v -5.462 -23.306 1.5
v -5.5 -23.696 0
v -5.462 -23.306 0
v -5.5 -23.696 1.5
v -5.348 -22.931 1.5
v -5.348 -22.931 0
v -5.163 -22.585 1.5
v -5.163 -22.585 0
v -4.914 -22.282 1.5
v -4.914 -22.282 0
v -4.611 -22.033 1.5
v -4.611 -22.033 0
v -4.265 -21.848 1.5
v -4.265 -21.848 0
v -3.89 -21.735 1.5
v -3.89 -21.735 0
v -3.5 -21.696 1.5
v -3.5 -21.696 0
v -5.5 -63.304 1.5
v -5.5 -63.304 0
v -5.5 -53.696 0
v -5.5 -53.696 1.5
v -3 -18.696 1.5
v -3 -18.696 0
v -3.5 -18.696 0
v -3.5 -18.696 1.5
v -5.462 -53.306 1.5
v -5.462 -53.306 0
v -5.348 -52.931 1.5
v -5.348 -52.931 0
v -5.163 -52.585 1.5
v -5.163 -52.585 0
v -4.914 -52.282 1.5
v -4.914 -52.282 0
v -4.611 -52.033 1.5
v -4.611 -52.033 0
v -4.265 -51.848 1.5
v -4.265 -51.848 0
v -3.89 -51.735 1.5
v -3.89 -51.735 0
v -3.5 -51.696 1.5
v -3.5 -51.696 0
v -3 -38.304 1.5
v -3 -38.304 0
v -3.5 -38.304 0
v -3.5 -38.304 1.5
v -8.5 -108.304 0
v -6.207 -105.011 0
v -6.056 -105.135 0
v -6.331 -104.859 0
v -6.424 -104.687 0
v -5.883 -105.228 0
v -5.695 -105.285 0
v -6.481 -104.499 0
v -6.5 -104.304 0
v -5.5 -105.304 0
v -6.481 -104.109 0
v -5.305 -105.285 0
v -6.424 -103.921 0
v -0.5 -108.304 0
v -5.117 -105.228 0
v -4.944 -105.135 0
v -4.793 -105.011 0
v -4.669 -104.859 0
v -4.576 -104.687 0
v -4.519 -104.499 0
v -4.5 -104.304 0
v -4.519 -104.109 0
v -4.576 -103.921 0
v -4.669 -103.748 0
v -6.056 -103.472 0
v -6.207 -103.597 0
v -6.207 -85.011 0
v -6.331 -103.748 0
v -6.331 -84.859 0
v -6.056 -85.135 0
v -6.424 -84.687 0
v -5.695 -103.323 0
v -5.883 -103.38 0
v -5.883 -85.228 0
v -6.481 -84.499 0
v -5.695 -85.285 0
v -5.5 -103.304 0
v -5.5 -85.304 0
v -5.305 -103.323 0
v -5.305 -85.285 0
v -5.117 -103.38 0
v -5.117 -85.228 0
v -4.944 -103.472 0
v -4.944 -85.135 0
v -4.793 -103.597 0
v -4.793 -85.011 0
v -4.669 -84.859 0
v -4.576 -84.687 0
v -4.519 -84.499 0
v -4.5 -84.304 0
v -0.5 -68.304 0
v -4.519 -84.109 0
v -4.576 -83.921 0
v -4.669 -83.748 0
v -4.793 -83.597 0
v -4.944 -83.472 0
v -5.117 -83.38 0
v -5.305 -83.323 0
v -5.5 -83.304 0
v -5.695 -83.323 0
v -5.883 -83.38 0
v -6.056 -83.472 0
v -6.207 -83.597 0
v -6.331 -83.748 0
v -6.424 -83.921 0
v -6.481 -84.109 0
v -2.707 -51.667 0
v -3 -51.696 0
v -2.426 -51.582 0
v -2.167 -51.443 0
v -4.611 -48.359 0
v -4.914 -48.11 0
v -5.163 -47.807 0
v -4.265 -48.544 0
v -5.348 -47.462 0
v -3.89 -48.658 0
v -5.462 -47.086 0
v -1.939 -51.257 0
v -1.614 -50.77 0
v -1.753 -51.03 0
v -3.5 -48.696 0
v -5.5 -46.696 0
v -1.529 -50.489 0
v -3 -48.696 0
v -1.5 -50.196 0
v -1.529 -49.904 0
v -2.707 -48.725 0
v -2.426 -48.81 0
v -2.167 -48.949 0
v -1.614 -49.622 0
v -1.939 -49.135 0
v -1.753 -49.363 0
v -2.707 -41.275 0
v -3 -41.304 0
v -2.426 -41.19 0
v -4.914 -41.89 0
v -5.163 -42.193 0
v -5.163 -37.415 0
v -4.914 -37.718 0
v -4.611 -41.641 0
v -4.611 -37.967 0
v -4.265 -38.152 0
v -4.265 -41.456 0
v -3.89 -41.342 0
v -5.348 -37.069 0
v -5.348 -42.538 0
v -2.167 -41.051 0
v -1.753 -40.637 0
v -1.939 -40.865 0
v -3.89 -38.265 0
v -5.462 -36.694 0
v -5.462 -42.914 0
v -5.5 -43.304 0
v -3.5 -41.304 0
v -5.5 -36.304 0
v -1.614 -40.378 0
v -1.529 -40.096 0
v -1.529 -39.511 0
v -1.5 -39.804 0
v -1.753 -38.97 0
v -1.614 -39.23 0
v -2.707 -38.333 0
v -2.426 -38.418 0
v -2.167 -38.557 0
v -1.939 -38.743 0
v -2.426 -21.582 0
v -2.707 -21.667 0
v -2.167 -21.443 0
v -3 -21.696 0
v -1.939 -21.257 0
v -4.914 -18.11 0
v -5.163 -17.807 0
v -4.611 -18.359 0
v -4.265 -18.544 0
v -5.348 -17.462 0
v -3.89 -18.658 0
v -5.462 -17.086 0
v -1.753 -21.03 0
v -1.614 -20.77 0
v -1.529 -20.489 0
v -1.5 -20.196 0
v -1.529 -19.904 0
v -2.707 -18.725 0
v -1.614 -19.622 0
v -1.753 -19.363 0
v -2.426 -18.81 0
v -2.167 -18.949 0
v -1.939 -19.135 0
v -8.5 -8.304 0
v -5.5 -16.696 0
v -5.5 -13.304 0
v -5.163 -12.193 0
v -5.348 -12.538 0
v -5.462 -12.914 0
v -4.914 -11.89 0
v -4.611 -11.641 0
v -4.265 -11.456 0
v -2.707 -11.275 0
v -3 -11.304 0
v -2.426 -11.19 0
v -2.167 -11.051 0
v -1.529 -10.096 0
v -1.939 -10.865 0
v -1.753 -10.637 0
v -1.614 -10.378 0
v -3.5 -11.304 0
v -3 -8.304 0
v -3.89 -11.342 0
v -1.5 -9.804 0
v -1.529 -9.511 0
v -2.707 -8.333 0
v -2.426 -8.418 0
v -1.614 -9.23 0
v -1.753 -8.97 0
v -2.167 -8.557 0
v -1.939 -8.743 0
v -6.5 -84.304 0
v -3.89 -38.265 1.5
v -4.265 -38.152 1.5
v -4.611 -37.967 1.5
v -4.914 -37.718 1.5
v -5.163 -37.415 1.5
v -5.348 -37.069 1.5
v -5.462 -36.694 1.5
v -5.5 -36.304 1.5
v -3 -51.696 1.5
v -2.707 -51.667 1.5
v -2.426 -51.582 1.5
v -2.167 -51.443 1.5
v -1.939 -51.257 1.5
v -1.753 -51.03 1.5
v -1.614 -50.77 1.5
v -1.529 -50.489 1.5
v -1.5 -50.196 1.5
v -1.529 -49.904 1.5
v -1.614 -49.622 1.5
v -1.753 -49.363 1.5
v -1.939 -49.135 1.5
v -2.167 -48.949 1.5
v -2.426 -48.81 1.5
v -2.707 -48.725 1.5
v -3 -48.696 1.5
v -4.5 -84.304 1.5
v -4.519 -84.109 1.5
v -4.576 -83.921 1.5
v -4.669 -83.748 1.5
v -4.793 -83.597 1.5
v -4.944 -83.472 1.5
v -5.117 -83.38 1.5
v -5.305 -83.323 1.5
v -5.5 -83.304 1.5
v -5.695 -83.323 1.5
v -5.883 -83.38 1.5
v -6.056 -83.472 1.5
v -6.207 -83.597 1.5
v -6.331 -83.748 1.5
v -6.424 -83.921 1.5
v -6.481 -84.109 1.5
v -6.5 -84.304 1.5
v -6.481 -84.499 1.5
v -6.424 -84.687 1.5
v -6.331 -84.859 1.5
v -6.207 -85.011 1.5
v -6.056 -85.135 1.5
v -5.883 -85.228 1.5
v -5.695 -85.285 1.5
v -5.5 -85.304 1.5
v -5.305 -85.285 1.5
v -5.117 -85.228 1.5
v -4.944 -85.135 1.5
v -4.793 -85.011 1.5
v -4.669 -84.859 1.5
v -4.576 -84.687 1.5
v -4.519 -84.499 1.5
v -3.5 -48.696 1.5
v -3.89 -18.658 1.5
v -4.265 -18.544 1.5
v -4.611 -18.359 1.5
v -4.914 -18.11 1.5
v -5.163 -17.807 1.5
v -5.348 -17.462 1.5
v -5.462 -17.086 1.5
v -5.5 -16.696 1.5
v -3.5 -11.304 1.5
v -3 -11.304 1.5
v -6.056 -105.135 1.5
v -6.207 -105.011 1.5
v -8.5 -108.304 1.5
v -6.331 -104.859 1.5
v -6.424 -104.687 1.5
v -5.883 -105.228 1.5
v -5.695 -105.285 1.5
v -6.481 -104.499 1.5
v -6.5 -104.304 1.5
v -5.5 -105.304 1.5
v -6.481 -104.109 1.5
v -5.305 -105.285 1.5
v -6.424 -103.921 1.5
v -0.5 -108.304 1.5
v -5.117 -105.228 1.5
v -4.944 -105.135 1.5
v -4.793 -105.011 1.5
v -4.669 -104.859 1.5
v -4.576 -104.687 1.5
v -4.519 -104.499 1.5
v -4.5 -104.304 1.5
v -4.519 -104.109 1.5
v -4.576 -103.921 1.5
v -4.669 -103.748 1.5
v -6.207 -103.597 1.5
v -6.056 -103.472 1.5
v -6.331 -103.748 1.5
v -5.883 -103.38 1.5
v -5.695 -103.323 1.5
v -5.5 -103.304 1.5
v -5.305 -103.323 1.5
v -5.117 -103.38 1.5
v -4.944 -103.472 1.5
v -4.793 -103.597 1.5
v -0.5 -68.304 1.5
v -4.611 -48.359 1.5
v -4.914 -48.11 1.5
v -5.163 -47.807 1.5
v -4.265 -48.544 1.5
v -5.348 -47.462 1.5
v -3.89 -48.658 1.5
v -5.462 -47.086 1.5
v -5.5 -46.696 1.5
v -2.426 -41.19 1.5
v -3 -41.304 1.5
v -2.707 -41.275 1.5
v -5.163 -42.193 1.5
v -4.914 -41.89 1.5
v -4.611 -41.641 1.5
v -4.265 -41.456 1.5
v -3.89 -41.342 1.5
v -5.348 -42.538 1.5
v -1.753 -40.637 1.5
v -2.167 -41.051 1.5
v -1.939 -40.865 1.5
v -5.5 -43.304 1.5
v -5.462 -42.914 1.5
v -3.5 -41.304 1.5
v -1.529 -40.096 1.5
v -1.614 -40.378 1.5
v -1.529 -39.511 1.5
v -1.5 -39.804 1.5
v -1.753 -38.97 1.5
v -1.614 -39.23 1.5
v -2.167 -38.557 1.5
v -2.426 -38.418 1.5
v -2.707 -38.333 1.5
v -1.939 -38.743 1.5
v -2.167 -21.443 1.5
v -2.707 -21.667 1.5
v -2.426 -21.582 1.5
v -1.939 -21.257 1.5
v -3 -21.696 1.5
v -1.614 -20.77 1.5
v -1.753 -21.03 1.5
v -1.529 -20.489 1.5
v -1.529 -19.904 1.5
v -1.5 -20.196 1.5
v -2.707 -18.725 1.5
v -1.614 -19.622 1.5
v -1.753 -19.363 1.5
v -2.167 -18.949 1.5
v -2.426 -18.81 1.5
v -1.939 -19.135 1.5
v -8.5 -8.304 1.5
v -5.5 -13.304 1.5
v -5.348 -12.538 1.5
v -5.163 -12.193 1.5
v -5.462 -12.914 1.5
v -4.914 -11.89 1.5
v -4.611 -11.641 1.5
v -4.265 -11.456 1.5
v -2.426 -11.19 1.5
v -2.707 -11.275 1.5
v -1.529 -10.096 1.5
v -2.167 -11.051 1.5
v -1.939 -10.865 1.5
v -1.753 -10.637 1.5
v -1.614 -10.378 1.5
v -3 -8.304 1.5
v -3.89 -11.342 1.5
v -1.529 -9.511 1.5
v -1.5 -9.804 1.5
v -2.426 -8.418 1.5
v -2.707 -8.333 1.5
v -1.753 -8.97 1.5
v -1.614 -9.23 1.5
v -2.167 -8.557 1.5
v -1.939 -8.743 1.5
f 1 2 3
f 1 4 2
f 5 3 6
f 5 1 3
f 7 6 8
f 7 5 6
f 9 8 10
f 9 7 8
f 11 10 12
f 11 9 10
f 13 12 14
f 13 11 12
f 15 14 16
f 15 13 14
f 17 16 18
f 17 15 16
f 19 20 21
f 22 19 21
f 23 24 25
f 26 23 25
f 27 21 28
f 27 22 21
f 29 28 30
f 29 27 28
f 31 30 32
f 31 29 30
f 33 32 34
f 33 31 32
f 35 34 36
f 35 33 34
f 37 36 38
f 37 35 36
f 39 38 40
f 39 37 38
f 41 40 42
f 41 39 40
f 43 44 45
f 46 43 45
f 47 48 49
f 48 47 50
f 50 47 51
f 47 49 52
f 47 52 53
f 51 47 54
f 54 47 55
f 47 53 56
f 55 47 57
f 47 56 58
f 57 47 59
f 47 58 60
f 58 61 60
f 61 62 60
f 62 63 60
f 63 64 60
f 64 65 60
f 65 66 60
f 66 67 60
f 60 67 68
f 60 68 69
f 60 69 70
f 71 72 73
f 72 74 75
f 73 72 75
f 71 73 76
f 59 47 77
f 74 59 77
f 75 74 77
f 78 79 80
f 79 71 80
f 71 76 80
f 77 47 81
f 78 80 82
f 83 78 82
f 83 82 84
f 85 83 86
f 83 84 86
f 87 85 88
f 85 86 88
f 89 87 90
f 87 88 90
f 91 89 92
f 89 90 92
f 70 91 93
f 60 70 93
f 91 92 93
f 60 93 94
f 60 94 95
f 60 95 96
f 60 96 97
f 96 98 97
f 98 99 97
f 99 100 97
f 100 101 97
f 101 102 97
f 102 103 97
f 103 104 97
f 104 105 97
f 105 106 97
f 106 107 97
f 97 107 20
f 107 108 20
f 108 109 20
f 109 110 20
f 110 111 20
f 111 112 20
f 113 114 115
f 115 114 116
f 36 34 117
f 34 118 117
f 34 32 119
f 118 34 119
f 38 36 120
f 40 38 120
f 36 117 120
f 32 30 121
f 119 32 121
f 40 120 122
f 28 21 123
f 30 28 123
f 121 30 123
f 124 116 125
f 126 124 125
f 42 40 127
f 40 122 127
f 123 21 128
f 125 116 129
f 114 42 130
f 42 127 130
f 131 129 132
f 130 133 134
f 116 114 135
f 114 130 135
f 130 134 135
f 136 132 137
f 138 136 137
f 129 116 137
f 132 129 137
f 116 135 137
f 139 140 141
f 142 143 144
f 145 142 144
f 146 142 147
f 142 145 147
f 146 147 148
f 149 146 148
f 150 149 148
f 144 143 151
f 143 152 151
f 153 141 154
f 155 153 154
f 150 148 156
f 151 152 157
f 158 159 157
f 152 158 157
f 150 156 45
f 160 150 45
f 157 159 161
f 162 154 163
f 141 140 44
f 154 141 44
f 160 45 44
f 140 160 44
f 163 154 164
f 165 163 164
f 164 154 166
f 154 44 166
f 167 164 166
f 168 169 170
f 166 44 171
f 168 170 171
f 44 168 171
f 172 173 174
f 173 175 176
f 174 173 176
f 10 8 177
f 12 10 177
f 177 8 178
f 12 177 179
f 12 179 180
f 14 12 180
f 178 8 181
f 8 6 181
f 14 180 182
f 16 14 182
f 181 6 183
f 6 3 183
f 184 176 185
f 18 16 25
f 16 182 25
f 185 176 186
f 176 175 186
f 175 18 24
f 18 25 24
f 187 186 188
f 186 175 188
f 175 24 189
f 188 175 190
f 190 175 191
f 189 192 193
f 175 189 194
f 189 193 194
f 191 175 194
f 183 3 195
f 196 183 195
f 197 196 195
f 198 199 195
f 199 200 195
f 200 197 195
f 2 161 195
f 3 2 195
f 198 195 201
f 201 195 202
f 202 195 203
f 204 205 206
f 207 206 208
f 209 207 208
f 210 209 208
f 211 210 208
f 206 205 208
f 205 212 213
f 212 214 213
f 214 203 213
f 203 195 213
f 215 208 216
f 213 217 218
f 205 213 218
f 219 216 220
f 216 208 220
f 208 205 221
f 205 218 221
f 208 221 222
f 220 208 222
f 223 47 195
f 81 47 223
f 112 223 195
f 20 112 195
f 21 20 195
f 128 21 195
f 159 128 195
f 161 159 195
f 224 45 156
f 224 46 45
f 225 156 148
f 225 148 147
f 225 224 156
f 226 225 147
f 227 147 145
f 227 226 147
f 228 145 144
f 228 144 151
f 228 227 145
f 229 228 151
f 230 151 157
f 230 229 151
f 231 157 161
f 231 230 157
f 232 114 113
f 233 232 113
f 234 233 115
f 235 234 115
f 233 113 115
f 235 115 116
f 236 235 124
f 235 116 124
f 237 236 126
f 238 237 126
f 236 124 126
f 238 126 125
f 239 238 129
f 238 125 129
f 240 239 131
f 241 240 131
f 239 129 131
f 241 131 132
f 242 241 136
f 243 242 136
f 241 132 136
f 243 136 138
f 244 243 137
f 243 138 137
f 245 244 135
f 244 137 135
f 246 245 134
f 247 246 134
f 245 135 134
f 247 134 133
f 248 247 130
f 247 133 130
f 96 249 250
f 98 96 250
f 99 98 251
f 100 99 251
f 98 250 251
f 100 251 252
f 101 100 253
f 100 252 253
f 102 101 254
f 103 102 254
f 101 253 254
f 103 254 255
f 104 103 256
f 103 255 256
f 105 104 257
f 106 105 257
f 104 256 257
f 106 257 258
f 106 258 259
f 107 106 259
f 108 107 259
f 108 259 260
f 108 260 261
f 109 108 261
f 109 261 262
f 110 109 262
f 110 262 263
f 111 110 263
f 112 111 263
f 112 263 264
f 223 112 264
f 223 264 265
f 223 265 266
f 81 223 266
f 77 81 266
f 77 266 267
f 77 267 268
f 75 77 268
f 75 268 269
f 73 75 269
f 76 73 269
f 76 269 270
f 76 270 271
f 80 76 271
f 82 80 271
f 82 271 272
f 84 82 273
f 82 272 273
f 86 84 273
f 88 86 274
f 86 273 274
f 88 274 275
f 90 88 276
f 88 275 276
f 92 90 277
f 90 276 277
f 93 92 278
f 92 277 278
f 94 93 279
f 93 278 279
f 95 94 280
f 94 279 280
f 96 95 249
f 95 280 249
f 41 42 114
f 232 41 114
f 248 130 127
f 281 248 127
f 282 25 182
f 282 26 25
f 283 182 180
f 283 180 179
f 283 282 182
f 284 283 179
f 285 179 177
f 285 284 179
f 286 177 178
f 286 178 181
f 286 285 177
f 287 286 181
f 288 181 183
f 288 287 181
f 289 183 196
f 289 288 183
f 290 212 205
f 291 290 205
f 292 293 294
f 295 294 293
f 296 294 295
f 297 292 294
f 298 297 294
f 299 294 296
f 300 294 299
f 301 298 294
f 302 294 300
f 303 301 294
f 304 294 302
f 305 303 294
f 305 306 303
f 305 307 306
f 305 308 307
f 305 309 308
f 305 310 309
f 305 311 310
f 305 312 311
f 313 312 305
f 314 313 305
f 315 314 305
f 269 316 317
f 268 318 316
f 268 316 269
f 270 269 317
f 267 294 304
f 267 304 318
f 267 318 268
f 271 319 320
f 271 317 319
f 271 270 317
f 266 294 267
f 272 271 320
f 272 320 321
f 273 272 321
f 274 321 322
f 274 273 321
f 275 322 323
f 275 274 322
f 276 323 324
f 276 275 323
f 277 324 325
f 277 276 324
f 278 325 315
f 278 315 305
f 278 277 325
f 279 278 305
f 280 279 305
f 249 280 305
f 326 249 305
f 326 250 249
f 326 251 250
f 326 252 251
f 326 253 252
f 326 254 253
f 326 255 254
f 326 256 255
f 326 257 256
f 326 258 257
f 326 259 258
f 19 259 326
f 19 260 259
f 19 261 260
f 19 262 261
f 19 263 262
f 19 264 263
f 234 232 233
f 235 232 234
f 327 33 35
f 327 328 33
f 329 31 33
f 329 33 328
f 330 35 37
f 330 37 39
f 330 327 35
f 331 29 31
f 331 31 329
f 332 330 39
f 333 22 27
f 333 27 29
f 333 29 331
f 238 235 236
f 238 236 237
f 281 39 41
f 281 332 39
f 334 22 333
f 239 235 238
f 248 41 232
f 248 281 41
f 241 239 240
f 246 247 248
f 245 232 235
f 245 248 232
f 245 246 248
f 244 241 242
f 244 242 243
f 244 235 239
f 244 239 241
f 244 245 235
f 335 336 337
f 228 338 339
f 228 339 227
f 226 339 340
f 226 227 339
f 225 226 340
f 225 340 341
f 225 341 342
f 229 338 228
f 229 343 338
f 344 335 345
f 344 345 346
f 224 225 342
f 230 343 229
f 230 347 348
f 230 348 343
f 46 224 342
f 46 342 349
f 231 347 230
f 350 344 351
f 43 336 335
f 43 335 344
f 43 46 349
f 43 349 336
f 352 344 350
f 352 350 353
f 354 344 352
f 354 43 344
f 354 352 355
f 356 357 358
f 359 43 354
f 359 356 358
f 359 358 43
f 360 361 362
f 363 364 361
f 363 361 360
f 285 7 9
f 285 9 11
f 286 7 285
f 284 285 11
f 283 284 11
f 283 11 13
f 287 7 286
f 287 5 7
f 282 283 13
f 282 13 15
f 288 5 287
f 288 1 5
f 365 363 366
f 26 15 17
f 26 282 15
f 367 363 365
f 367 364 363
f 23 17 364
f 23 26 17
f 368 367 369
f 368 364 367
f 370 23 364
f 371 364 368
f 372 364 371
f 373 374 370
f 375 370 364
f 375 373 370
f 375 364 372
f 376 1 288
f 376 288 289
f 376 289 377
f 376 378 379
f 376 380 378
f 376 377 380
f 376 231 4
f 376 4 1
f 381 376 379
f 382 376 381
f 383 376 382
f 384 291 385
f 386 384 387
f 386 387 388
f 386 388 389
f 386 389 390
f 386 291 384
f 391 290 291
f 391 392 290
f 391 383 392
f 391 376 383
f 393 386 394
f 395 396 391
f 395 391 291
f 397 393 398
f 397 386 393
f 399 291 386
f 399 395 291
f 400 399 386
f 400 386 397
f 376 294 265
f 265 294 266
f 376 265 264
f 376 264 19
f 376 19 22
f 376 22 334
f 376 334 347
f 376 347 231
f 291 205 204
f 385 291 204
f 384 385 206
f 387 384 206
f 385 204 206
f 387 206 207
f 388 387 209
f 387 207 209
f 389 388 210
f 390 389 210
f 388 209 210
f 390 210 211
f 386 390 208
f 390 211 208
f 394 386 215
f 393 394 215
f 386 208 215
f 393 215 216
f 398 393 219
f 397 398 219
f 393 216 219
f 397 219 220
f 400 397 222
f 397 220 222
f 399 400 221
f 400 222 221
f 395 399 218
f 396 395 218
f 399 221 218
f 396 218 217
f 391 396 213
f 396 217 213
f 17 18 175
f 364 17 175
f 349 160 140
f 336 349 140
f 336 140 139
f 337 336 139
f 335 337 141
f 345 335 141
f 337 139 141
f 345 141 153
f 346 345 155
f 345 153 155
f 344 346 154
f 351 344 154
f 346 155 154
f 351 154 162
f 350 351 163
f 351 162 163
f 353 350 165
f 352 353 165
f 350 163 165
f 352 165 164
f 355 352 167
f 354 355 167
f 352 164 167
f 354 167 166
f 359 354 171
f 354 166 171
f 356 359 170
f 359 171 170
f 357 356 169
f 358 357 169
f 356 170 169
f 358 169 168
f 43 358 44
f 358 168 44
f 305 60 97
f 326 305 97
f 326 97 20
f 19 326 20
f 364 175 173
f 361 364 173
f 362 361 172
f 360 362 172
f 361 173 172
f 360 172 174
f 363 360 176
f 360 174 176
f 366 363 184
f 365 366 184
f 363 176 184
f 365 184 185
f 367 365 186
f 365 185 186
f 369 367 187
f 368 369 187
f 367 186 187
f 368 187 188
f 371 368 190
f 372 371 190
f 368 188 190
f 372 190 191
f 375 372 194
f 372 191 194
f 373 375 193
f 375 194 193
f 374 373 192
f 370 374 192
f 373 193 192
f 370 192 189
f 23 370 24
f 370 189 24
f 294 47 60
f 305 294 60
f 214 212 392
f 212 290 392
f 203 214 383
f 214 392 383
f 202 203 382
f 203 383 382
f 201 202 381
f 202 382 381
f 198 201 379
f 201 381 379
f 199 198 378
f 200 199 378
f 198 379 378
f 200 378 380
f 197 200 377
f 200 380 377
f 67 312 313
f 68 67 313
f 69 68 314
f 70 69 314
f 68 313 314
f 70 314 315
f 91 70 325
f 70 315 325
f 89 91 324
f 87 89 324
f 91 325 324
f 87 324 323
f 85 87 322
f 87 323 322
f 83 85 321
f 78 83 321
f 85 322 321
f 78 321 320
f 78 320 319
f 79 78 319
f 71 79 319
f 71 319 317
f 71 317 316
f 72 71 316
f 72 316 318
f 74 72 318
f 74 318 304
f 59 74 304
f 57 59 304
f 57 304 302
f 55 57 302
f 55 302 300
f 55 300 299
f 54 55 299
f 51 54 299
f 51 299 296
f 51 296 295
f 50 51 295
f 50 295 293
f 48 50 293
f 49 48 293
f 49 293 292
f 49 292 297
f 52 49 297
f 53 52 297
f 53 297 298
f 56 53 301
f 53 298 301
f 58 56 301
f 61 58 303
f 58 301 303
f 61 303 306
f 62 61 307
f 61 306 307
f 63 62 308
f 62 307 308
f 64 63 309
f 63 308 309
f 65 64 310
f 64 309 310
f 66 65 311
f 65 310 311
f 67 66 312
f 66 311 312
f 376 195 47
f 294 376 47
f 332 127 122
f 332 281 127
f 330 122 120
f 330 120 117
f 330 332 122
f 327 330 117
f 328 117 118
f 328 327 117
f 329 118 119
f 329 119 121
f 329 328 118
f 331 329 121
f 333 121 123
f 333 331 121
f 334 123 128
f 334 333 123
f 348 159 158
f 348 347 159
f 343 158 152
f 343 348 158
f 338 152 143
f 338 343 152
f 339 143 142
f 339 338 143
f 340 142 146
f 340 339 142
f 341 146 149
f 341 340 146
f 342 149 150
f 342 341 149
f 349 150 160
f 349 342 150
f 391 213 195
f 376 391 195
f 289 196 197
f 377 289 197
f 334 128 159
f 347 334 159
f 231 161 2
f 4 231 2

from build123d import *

# Parameters (mm, degrees)
SKETCH1_R           = 1.5
BOSS_EXTRUDE1_DEPTH = 1.5
FILLET1_R           = 2
SKETCH2_R           = 1
CUT_EXTRUDE1_DEPTH  = 5


with BuildPart() as part:
    # Sketch1 → Boss-Extrude1 (new body)
    with BuildSketch(Plane.XY):
        with BuildLine():
            Line((-5.5, -11.303847577), (-3, -11.303847577))
            ThreePointArc((-3, -11.303847577), (-4.5, -9.803847577), (-3, -8.303847577))
            Line((-3, -8.303847577), (-8.5, -8.303847577))
            Line((-8.5, -8.303847577), (-8.5, -108.303847577))
            Line((-8.5, -108.303847577), (-0.5, -108.303847577))
            Line((-0.5, -108.303847577), (-0.5, -68.303847577))
            Line((-0.5, -68.303847577), (-5.5, -63.303847577))
            Line((-5.5, -63.303847577), (-5.5, -51.696152423))
            Line((-5.5, -51.696152423), (-3, -51.696152423))
            ThreePointArc((-3, -51.696152423), (-4.5, -50.196152423), (-3, -48.696152423))
            Line((-3, -48.696152423), (-5.5, -48.696152423))
            Line((-5.5, -48.696152423), (-5.5, -41.303847577))
            Line((-5.5, -41.303847577), (-3, -41.303847577))
            ThreePointArc((-3, -41.303847577), (-4.5, -39.803847577), (-3, -38.303847577))
            Line((-3, -38.303847577), (-5.5, -38.303847577))
            Line((-5.5, -38.303847577), (-5.5, -21.696152423))
            Line((-5.5, -21.696152423), (-3, -21.696152423))
            ThreePointArc((-3, -21.696152423), (-4.5, -20.196152423), (-3, -18.696152423))
            Line((-3, -18.696152423), (-5.5, -18.696152423))
            Line((-5.5, -18.696152423), (-5.5, -11.303847577))
        make_face()
        with Locations((-3, -39.803847577)):
            Circle(SKETCH1_R)
        with Locations((-3, -50.196152423)):
            Circle(SKETCH1_R)
        with Locations((-3, -9.803847577)):
            Circle(SKETCH1_R)
        with Locations((-3, -20.196152423)):
            Circle(SKETCH1_R)
    extrude(amount=BOSS_EXTRUDE1_DEPTH)

    # Fillet1
    fillet1_edges = [part.edges().sort_by_distance(p)[0] for p in [
        (-5.5, -51.696152423, 0.75),
        (-5.5, -11.303847577, 0.75),
        (-5.5, -18.696152423, 0.75),
        (-5.5, -21.696152423, 0.75),
        (-5.5, -38.303847577, 0.75),
        (-5.5, -41.303847577, 0.75),
        (-5.5, -48.696152423, 0.75),
    ]]
    fillet(fillet1_edges, radius=FILLET1_R)

    # Sketch2 → Cut-Extrude1 (cut)
    with BuildSketch(Plane.XY.offset(1.5)):
        with Locations((-5.5, -104.303847577)):
            Circle(SKETCH2_R)
        with Locations((-5.5, -84.303847577)):
            Circle(SKETCH2_R)
    extrude(amount=-CUT_EXTRUDE1_DEPTH, mode=Mode.SUBTRACT)


solid = part.part
